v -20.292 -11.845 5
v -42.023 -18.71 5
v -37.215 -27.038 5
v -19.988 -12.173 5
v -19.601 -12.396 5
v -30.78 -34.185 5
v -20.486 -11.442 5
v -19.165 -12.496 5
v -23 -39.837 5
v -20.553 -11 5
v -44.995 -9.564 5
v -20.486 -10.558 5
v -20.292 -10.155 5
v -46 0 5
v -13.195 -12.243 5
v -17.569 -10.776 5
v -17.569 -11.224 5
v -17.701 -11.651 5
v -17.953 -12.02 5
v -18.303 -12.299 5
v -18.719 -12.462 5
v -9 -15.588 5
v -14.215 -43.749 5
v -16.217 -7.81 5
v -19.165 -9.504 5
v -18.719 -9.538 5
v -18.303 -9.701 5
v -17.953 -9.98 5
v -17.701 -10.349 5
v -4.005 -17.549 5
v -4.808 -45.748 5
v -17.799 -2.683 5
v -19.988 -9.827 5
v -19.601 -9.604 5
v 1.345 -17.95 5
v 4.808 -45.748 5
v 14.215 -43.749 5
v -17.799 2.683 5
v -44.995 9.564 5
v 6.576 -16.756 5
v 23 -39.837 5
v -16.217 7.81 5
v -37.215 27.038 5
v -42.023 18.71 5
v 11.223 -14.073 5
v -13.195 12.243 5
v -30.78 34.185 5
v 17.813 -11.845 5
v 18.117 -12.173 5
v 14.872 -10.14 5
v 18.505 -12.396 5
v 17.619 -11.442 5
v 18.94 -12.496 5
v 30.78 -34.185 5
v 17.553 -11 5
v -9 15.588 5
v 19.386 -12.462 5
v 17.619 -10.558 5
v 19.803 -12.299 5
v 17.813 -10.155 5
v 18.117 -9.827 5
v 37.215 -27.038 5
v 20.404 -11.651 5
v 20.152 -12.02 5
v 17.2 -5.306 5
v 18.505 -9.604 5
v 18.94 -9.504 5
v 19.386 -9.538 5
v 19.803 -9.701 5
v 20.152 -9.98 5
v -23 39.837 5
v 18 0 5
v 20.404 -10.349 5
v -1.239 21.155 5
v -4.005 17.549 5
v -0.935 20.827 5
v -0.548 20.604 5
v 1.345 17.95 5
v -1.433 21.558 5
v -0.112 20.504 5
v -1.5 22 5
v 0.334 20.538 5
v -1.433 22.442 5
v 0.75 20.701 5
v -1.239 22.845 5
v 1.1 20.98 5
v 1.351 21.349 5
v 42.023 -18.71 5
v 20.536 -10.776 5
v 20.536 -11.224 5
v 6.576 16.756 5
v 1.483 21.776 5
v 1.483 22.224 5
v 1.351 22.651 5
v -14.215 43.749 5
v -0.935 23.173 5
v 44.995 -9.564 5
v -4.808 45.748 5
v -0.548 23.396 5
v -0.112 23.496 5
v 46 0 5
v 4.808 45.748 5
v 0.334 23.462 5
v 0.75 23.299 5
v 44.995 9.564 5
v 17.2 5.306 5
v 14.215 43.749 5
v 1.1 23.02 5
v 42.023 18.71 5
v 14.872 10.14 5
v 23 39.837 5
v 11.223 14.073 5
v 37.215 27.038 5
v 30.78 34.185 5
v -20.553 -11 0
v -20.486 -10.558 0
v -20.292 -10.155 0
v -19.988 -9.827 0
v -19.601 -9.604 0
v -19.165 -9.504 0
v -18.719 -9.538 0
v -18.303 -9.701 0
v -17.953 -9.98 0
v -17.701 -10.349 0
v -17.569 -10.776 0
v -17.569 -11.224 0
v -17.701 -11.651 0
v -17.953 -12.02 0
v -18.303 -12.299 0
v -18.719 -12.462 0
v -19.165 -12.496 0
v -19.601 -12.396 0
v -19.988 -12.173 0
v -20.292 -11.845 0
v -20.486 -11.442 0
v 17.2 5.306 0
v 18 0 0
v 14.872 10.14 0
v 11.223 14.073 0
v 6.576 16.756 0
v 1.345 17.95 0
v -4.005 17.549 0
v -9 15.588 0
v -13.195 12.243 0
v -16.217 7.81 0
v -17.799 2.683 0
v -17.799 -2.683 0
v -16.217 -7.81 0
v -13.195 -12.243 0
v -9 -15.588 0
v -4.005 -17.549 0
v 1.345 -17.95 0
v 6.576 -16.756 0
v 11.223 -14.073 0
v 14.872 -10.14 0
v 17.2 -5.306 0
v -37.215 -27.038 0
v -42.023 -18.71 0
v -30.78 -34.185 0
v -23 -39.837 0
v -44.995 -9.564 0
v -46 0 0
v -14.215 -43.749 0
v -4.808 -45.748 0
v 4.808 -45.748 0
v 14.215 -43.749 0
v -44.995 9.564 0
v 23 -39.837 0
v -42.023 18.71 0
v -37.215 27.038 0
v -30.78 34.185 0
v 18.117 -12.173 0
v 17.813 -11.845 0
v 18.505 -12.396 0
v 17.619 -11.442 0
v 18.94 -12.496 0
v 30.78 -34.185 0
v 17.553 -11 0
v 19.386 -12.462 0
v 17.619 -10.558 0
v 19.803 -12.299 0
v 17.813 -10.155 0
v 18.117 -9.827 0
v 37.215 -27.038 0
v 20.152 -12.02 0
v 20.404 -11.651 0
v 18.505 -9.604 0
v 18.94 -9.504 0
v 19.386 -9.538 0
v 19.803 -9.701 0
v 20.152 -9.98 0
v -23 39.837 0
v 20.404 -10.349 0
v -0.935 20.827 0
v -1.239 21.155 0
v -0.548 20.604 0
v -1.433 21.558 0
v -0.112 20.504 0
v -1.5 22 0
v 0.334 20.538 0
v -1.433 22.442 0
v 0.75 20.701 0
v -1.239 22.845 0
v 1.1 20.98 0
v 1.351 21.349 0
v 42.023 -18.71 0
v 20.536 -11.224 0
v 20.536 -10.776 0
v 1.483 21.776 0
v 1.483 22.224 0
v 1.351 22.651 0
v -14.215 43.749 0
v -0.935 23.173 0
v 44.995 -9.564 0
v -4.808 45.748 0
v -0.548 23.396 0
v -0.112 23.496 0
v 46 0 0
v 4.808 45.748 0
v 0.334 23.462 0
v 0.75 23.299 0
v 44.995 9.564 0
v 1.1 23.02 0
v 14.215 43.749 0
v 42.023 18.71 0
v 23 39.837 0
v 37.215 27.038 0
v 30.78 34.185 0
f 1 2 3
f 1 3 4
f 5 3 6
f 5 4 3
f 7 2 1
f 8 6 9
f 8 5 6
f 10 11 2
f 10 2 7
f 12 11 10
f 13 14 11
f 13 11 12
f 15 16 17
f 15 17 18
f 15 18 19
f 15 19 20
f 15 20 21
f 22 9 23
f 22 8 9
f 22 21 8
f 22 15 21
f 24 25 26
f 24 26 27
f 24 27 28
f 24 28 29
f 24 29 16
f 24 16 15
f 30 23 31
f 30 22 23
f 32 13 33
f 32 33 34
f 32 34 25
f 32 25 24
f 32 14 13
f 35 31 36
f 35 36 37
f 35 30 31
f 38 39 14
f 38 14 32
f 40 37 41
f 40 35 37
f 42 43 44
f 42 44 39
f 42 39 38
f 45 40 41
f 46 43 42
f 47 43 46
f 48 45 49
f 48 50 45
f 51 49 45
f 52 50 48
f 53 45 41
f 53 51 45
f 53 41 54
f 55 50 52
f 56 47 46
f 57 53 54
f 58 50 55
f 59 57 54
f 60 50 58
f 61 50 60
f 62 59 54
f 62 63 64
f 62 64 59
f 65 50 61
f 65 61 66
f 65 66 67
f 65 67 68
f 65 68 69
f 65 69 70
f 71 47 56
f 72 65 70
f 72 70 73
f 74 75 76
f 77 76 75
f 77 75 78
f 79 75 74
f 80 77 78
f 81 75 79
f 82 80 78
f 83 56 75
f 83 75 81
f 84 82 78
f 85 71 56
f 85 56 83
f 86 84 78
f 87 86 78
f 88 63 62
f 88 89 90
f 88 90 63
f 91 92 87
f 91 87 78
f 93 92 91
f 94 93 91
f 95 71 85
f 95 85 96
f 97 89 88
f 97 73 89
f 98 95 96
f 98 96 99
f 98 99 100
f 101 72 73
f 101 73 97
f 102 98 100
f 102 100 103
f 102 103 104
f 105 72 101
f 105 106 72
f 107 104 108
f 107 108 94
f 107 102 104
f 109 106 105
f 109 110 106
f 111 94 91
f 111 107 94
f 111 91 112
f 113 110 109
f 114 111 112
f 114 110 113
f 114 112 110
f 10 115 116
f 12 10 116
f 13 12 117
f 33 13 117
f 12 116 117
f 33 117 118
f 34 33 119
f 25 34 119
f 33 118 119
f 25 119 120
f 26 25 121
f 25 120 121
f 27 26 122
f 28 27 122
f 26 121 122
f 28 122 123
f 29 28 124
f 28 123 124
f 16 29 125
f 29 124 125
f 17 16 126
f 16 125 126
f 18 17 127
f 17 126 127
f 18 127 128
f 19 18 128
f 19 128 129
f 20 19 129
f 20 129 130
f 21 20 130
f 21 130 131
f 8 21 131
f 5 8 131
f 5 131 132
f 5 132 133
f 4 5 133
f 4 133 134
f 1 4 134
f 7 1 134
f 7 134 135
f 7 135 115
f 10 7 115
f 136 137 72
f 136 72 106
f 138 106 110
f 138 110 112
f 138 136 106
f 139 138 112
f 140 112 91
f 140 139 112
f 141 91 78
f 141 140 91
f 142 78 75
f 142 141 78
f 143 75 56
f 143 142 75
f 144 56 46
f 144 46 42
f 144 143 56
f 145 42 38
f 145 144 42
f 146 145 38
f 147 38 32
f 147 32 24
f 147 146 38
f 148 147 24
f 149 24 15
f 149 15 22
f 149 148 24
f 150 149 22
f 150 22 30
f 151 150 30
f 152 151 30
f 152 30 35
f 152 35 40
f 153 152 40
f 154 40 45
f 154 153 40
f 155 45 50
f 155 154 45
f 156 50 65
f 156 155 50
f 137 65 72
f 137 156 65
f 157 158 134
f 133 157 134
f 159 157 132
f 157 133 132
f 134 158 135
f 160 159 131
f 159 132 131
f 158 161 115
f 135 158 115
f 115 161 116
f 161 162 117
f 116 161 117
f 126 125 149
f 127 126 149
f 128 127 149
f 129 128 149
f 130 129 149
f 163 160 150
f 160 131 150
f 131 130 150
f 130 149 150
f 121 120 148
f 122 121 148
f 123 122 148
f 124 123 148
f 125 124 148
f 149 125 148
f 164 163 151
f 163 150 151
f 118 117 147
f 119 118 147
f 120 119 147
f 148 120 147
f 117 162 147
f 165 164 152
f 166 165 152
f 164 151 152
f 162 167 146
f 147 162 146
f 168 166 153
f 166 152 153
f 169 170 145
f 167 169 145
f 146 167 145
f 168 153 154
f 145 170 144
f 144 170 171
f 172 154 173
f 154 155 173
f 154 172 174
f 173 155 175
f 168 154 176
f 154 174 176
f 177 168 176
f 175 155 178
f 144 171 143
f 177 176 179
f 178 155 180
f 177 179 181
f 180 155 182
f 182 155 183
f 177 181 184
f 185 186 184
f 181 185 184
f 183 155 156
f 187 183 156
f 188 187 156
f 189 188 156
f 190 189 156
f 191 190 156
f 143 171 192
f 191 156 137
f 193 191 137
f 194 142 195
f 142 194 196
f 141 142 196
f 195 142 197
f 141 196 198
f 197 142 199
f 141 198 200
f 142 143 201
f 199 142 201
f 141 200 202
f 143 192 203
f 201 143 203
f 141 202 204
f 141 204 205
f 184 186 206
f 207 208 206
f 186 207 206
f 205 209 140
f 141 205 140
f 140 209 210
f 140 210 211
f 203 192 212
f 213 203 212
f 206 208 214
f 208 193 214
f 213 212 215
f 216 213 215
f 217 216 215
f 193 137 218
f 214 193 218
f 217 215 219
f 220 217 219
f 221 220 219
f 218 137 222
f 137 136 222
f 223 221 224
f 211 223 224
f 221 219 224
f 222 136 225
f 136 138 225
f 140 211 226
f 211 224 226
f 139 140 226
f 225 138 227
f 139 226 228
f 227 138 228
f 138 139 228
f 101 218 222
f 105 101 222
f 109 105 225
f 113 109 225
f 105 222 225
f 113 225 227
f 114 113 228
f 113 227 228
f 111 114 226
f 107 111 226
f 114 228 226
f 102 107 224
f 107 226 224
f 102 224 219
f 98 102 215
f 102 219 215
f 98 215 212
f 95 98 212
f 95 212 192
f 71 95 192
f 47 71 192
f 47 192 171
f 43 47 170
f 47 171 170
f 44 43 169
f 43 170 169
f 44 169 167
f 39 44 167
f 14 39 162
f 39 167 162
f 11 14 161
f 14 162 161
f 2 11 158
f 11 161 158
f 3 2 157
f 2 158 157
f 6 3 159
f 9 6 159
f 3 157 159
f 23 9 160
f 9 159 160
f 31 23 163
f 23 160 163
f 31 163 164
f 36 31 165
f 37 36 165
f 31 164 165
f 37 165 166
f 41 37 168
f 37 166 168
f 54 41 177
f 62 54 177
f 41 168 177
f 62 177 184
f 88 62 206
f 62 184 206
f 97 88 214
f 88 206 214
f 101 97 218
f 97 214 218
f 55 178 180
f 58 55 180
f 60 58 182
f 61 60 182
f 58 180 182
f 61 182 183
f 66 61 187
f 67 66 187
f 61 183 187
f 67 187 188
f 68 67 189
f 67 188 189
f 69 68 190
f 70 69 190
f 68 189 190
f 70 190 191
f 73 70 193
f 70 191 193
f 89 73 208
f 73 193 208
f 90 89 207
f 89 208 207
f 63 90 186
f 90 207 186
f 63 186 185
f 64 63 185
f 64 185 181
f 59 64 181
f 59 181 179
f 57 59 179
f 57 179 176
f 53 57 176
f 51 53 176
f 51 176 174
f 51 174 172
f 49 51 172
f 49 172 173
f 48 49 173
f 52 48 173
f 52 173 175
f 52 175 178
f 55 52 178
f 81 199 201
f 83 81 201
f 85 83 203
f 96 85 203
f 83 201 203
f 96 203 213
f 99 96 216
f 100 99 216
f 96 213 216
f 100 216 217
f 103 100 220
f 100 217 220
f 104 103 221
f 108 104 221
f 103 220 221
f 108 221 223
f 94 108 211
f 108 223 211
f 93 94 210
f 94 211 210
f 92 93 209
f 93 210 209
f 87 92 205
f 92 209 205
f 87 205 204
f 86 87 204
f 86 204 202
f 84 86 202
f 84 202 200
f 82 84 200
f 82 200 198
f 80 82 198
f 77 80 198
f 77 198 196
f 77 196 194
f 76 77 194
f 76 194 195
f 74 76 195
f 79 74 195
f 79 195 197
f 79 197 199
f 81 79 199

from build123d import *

# Parameters (mm, degrees)
SKETCH2_R               = 46
SKETCH2_R_2             = 18
BOSS_EXTRUDE2_DEPTH     = 5
SKETCH5_R               = 1.5
CUT_EXTRUDE1_DEPTH      = 1
CUT_EXTRUDE1_DEPTH_BACK = 6


with BuildPart() as part:
    # Sketch2 → Boss-Extrude2 (new body)
    with BuildSketch(Plane.XY):
        Circle(SKETCH2_R)
        Circle(SKETCH2_R_2, mode=Mode.SUBTRACT)
    extrude(amount=BOSS_EXTRUDE2_DEPTH)

    # Sketch5 → Cut-Extrude1 (cut, two sides)
    with BuildSketch(Plane(origin=(0, 0, 0), x_dir=(-1, 0, 0), z_dir=(0, 0, -1))) as cut_extrude1_sk:
        with Locations((0, 22)):
            Circle(SKETCH5_R)
        with Locations((19.052558883, -11)):
            Circle(SKETCH5_R)
        with Locations((-19.052558883, -11)):
            Circle(SKETCH5_R)
    extrude(amount=CUT_EXTRUDE1_DEPTH, mode=Mode.SUBTRACT)
    extrude(cut_extrude1_sk.sketch, amount=-CUT_EXTRUDE1_DEPTH_BACK, mode=Mode.SUBTRACT)


solid = part.part
